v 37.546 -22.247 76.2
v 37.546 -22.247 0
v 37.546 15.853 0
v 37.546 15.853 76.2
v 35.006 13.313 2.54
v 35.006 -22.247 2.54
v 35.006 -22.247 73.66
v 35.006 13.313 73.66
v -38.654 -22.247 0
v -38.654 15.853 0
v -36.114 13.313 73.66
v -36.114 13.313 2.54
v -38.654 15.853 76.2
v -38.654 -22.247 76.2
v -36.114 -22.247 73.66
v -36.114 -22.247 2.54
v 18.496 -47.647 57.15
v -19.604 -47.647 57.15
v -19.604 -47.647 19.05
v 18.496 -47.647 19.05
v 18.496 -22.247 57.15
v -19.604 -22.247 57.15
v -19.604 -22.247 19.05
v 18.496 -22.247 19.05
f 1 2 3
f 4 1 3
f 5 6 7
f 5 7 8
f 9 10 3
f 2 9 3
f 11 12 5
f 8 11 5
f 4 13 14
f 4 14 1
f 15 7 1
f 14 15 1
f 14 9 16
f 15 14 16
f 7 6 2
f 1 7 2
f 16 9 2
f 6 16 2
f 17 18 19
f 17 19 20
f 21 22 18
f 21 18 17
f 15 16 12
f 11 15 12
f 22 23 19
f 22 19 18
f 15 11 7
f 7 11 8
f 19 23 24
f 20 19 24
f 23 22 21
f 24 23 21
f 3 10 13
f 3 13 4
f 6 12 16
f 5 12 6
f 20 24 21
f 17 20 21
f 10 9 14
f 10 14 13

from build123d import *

# Parameters (mm, degrees)
F0_W     = 76.2
F0_H     = 38.1
F1_DEPTH = 76.2
F3_T     = -2.54
F2_W     = 38.1
F2_H     = 38.1
F4_DEPTH = 25.4


with BuildPart() as f1:
    # F0 (on Top) → F1 (new body)
    with BuildSketch(Plane.XY):
        with Locations((-0.554262, -3.197359)):
            Rectangle(F0_W, F0_H)
    extrude(amount=F1_DEPTH)

    # F3
    f3_openings = [f1.faces().sort_by_distance(p)[0] for p in [
        (-0.554262, -22.247359, 38.1),
    ]]
    offset(amount=F3_T, openings=f3_openings)


with BuildPart() as f4:
    # F2 (on face) → F4 (new body)
    with BuildSketch(Plane.XZ.offset(22.247359)):
        with Locations((-0.554262, 38.1)):
            Rectangle(F2_W, F2_H)
    extrude(amount=F4_DEPTH)


solid = Compound([f1.part, f4.part])
